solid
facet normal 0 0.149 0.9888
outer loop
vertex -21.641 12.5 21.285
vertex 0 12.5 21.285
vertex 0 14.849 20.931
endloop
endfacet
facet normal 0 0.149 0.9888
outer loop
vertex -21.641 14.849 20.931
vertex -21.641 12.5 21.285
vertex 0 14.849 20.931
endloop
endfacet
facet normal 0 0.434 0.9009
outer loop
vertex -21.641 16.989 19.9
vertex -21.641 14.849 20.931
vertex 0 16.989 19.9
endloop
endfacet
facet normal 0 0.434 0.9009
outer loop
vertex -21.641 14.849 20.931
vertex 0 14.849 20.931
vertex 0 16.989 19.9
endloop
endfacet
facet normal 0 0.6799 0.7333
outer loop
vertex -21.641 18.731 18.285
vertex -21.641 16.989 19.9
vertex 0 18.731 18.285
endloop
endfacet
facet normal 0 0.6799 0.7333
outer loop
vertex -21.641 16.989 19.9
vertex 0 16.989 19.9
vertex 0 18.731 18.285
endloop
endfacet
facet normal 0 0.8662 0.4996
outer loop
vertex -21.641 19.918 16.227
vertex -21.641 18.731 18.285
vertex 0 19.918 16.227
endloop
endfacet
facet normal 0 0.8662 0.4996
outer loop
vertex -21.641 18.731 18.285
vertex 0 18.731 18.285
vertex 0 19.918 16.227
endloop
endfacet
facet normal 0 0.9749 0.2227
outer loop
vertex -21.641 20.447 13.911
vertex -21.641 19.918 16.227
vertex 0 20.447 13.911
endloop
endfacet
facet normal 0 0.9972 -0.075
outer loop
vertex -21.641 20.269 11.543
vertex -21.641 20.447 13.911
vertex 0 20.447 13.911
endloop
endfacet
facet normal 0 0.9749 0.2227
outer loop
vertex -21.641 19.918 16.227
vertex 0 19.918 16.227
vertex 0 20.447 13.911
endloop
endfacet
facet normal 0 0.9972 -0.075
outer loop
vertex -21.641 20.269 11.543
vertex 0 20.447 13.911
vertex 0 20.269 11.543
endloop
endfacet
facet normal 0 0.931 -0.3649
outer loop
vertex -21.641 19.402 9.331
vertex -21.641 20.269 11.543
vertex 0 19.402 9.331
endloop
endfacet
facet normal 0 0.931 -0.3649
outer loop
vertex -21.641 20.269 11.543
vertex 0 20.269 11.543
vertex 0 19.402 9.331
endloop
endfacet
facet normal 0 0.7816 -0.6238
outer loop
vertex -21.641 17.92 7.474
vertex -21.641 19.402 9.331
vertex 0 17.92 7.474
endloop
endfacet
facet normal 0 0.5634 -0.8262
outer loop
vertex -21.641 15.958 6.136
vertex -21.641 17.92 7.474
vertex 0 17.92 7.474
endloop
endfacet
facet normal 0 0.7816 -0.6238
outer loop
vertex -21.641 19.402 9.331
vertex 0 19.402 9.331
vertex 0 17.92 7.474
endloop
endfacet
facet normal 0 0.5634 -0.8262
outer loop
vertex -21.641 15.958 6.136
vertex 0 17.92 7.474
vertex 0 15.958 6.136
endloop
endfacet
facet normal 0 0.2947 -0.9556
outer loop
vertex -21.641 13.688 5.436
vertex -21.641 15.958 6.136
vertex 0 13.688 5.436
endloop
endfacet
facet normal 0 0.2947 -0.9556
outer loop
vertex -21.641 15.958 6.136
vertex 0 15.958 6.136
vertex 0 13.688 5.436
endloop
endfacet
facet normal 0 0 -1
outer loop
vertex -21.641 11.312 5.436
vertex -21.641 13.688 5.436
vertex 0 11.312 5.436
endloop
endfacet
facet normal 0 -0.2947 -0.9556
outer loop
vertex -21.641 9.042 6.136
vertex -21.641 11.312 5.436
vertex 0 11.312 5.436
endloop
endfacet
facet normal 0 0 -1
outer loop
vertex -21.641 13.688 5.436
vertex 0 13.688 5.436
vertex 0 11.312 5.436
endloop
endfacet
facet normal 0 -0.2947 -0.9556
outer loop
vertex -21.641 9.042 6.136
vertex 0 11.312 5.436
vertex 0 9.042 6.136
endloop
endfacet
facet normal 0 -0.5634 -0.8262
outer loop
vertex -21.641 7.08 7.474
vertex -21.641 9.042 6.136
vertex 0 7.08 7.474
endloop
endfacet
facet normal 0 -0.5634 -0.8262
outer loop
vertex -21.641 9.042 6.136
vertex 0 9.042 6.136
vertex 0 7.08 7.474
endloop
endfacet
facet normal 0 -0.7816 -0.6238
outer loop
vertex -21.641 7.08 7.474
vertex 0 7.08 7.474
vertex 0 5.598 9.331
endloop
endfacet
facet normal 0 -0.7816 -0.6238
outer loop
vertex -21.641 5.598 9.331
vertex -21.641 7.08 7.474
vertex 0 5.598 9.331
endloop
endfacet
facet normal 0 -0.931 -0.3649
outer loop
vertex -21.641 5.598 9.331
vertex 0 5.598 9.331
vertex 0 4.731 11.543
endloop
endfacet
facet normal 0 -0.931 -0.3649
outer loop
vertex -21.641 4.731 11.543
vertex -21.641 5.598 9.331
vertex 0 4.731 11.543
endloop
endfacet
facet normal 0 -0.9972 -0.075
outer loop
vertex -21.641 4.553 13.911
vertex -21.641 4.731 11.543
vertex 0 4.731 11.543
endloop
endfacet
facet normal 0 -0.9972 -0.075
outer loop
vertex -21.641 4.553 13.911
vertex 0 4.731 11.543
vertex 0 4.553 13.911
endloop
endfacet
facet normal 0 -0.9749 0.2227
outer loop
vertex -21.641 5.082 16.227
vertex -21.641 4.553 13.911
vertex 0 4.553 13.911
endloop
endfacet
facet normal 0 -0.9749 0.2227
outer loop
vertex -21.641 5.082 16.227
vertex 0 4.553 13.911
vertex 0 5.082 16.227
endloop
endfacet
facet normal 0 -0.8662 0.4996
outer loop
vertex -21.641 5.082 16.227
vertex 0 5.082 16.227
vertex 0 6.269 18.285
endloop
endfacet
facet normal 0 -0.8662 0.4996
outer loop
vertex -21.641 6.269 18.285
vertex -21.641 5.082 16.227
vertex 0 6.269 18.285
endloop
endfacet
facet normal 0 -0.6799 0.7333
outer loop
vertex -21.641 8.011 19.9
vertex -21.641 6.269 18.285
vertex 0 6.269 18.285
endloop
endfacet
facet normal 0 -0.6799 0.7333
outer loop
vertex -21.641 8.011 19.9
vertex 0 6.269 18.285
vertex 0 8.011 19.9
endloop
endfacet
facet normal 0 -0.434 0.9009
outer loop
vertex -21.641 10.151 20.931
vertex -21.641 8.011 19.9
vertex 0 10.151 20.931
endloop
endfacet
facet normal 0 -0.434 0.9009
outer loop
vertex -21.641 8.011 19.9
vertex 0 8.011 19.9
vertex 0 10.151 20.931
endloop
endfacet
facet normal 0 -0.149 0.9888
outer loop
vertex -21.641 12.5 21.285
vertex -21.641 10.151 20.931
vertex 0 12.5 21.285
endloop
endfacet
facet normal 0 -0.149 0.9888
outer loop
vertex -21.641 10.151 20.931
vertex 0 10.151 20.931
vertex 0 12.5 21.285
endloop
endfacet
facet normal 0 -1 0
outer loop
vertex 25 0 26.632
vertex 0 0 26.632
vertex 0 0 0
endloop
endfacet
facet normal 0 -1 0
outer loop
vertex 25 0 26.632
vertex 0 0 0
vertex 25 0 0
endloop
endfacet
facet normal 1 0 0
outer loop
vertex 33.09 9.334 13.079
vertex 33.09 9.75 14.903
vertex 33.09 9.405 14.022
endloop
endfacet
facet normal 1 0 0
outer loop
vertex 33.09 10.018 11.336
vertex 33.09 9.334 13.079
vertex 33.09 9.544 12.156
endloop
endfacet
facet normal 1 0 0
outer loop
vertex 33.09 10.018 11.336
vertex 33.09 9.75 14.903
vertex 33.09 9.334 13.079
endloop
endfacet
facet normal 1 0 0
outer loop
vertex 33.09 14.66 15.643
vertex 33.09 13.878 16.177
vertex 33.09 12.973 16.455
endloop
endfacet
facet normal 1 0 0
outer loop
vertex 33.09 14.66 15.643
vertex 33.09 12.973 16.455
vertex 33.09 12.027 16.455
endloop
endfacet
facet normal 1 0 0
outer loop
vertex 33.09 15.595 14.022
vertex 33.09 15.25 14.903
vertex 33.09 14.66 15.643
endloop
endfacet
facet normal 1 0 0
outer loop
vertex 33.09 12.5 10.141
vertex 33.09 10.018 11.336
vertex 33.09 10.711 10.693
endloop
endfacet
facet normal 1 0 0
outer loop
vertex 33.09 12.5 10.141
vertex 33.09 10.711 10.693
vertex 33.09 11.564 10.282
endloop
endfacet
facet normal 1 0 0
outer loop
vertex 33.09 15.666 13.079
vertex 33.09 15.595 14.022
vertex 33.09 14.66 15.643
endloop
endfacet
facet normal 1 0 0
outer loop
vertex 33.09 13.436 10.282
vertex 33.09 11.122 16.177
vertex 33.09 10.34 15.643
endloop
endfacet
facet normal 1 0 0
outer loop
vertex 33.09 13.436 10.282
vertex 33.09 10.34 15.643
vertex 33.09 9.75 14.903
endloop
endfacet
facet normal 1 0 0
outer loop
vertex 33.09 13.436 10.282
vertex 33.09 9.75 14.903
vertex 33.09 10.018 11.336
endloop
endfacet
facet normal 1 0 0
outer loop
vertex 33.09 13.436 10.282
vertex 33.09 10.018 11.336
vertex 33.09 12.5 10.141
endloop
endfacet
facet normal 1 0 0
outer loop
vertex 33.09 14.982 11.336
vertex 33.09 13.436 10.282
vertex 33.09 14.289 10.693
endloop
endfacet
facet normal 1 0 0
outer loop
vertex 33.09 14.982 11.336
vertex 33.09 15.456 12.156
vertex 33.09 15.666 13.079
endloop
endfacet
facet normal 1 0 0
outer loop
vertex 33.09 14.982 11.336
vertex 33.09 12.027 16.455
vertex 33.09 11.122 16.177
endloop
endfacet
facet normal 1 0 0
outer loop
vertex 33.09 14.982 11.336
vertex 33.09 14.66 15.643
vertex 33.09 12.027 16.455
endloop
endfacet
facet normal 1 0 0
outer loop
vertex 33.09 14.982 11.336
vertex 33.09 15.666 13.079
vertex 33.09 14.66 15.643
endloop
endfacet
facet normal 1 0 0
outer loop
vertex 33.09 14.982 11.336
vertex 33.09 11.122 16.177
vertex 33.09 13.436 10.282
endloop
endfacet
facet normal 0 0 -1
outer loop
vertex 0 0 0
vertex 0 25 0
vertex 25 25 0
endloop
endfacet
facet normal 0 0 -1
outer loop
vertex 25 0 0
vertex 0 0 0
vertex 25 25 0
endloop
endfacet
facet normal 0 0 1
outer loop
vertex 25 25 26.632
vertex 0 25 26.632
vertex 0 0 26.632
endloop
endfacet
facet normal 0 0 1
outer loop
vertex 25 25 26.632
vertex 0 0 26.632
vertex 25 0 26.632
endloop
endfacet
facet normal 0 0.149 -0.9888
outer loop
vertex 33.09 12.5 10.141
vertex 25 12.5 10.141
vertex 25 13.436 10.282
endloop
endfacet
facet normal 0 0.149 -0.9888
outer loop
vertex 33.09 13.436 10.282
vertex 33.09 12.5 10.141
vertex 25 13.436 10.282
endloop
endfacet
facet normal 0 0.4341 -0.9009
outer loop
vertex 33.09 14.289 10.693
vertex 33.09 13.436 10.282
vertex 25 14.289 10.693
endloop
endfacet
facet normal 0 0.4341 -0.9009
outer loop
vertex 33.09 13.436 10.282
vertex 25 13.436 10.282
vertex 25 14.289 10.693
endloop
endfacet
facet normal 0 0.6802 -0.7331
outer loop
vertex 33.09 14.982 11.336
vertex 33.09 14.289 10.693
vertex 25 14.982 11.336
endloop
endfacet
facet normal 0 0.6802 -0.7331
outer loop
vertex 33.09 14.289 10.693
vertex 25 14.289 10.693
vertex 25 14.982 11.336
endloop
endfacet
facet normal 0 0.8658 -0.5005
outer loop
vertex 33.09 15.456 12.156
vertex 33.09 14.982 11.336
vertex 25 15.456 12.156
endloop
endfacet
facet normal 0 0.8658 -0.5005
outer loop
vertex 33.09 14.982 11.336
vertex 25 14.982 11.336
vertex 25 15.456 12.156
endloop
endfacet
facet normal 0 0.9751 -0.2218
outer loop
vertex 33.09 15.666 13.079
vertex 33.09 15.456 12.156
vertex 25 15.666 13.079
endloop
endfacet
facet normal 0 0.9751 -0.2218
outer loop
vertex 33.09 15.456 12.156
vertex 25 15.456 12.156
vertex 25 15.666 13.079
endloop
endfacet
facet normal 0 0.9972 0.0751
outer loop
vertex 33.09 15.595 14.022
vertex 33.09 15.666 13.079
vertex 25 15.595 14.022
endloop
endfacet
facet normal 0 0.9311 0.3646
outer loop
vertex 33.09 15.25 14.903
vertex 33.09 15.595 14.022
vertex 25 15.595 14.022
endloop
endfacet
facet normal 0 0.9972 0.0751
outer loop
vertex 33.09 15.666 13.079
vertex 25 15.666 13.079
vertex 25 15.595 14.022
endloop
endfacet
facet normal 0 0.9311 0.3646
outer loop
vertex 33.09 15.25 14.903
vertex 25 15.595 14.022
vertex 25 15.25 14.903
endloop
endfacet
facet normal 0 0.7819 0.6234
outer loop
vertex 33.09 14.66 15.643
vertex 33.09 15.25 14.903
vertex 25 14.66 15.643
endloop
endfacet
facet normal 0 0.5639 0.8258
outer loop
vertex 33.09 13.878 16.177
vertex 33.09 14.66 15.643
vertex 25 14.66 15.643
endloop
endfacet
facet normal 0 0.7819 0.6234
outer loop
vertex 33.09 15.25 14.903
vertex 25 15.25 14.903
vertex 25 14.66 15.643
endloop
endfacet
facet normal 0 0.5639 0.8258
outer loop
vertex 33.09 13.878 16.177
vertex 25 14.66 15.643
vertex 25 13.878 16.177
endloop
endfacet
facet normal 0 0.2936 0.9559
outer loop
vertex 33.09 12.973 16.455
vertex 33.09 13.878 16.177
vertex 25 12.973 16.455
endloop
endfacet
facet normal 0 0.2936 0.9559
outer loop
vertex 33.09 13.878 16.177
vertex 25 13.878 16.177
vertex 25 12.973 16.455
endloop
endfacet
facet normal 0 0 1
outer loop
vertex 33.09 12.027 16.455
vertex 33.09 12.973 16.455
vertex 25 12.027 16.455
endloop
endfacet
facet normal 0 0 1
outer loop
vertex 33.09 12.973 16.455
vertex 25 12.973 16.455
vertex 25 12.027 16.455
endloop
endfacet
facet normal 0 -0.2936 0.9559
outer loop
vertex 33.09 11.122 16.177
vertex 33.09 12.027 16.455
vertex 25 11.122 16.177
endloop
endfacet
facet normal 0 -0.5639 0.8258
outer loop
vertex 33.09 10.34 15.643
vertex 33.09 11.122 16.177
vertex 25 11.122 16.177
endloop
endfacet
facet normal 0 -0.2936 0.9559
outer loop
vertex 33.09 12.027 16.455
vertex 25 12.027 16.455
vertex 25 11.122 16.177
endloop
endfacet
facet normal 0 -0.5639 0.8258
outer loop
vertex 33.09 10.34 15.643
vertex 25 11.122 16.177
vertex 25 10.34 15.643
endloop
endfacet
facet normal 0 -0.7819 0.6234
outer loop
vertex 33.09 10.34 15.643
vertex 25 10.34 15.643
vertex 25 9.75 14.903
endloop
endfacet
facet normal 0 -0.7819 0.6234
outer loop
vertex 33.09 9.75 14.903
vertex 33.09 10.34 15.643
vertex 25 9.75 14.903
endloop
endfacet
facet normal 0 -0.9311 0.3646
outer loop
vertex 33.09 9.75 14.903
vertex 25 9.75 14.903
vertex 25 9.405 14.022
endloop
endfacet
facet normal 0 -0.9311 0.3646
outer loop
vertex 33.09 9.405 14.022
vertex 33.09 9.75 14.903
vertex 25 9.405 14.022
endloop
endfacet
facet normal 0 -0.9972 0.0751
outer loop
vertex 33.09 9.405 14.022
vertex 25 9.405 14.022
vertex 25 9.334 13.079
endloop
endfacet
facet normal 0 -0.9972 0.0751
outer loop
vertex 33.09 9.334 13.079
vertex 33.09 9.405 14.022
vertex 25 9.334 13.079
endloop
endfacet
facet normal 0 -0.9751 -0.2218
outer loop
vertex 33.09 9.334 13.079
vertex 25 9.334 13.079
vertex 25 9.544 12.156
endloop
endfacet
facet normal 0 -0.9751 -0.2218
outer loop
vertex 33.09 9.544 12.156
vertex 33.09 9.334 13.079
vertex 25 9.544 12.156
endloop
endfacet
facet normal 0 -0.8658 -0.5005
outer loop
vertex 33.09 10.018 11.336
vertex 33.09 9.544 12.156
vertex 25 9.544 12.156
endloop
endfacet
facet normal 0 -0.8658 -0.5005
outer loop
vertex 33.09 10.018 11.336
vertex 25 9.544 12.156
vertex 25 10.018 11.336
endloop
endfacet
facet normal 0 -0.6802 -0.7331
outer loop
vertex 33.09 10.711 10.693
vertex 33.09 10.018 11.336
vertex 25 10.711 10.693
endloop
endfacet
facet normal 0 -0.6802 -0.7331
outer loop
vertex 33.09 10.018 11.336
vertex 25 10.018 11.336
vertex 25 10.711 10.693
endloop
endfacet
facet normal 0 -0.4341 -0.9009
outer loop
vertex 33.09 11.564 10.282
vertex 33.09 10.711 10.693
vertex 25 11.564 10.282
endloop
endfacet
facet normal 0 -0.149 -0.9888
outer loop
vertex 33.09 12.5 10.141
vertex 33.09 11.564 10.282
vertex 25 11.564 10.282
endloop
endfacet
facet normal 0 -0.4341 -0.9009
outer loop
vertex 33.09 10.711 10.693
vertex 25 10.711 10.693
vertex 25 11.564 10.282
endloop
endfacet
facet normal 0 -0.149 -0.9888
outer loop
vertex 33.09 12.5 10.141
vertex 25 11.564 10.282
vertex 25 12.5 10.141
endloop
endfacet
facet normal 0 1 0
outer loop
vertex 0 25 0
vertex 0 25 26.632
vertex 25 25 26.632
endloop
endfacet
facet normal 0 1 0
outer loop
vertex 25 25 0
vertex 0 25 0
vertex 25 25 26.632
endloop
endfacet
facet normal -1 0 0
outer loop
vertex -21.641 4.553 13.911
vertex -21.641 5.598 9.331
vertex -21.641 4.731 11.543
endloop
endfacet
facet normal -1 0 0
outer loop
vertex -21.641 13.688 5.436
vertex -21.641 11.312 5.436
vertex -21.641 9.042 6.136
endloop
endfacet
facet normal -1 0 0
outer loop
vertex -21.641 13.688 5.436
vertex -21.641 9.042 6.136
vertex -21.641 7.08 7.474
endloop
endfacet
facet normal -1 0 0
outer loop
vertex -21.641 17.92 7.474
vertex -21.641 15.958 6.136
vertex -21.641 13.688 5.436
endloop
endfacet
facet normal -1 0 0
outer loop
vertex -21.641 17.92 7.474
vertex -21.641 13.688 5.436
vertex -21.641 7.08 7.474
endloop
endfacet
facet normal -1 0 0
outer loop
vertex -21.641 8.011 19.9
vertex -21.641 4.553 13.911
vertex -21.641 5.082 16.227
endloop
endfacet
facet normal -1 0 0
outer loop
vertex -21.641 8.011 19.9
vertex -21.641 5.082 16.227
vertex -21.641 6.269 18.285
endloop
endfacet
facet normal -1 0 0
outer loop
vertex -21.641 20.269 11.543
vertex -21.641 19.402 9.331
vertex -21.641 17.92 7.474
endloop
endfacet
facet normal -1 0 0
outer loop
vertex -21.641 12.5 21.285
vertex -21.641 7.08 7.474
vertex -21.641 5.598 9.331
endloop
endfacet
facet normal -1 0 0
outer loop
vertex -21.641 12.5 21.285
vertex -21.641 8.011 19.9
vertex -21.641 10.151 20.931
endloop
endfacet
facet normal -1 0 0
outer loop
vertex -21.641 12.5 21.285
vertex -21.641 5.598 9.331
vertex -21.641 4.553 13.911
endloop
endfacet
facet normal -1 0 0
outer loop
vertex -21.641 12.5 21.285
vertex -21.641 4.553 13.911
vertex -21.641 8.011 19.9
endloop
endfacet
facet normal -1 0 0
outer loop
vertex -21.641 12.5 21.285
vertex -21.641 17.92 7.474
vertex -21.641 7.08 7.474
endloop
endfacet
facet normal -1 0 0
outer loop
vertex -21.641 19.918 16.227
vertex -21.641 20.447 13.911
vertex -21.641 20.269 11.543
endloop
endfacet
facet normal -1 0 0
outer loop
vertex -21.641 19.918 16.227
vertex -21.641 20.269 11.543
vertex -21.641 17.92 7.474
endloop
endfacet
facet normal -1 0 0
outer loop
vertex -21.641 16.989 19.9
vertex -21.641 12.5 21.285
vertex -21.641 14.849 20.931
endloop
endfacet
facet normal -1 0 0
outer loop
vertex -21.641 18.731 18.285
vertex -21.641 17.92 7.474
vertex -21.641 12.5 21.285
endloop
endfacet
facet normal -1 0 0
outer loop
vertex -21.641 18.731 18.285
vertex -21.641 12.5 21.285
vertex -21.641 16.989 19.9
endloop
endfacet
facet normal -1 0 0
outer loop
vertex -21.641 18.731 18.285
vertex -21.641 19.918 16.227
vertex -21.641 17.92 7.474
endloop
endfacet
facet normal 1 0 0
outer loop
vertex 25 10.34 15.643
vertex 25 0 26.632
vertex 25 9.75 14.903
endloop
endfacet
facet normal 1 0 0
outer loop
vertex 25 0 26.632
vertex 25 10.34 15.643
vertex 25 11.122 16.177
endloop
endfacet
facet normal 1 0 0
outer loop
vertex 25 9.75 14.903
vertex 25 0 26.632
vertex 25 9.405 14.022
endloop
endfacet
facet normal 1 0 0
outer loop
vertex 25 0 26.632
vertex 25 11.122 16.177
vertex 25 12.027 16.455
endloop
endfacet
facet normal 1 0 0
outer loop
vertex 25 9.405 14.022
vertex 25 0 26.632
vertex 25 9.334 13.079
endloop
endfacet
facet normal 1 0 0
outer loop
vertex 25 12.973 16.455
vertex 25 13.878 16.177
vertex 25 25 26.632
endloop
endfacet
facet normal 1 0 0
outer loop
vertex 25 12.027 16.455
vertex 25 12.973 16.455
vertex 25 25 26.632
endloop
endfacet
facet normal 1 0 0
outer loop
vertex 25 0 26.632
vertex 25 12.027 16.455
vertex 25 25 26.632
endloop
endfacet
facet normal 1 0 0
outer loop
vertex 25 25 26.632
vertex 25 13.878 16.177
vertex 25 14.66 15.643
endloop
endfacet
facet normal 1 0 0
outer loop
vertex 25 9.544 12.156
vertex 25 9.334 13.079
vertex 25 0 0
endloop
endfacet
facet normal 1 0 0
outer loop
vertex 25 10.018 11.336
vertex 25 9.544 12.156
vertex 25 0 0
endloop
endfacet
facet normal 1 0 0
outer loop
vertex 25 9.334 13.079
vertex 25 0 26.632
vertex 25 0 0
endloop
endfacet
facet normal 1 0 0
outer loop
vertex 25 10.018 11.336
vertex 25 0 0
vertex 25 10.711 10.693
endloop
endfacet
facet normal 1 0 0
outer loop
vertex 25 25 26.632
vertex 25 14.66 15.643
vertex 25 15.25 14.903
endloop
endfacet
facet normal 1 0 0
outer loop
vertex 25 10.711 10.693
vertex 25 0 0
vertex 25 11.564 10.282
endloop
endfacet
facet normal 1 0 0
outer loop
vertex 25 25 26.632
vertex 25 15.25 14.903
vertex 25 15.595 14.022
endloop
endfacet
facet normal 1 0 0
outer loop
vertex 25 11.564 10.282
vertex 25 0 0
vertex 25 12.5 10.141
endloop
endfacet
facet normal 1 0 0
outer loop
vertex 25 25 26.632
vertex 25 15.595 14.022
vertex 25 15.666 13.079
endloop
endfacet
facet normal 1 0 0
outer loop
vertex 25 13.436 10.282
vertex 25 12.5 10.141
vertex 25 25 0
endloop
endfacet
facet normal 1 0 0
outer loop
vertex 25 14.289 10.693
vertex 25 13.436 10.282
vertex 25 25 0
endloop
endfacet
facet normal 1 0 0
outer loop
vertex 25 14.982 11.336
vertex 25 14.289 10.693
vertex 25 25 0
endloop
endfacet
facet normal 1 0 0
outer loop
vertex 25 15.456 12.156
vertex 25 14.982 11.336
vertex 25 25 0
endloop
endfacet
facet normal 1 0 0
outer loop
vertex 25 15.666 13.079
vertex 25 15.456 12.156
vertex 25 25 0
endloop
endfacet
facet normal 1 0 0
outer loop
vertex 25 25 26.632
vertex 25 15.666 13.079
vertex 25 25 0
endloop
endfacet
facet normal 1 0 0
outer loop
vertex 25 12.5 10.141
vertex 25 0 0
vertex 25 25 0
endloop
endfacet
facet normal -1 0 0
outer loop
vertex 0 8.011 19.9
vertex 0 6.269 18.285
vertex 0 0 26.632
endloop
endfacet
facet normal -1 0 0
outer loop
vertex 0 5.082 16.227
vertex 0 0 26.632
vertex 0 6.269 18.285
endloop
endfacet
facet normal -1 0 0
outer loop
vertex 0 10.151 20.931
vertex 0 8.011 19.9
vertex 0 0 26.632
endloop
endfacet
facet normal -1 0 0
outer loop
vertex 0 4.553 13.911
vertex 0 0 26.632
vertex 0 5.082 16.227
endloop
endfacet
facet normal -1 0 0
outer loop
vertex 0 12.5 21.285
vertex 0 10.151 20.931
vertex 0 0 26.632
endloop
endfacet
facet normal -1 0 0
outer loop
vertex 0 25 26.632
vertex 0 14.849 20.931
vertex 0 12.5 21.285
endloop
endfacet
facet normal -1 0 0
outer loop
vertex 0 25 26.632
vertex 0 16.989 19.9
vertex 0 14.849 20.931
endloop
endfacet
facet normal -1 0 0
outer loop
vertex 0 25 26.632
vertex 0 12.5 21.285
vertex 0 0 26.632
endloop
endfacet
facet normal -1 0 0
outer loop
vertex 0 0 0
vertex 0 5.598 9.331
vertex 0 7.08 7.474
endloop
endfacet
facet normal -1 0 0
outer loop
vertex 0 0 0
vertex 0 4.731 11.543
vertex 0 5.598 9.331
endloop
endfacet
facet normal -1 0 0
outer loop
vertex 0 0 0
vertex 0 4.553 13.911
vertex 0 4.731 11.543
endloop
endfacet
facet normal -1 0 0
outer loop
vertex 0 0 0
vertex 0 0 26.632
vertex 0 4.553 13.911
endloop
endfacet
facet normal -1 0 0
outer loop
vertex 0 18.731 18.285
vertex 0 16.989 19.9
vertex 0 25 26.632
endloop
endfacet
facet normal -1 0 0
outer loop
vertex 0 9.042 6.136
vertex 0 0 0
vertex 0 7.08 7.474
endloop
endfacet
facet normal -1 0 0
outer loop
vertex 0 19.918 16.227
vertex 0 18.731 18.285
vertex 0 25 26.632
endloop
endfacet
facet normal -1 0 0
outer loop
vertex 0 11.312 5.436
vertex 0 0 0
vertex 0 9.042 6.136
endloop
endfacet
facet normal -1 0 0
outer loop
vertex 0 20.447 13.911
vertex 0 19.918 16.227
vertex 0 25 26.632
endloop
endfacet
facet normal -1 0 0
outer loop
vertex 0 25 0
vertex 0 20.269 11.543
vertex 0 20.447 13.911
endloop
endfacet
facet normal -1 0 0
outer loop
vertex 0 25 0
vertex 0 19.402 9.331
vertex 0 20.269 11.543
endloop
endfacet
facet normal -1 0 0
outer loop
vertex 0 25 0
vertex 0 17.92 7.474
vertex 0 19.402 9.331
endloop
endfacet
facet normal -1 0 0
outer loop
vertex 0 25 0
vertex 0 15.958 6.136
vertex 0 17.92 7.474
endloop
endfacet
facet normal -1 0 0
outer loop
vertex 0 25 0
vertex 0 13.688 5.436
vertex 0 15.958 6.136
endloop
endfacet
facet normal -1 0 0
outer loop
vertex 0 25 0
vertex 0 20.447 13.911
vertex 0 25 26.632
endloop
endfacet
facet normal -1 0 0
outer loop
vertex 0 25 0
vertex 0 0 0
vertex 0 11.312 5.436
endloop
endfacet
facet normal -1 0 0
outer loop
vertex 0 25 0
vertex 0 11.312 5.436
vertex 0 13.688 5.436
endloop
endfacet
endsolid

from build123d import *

# Parameters (mm, degrees)
SKETCH1_W           = 25
SKETCH1_H           = 25
BOSS_EXTRUDE1_DEPTH = 26.6319
SKETCH2_R           = 7.96925
BOSS_EXTRUDE2_DEPTH = 21.6408
SKETCH3_R           = 3.175
BOSS_EXTRUDE3_DEPTH = 8.0899


with BuildPart() as part:
    # Sketch1 → Boss-Extrude1 (new body)
    with BuildSketch(Plane.XY):
        with Locations((12.5, 12.5)):
            Rectangle(SKETCH1_W, SKETCH1_H)
    extrude(amount=BOSS_EXTRUDE1_DEPTH)

    # Sketch2 → Boss-Extrude2 (add)
    with BuildSketch(Plane.ZY):
        with Locations((13.31595, 12.5)):
            Circle(SKETCH2_R)
    extrude(amount=BOSS_EXTRUDE2_DEPTH)

    # Sketch3 → Boss-Extrude3 (add)
    with BuildSketch(Plane(origin=(25, 0, 0), x_dir=(0, 0, -1), z_dir=(1, 0, 0))):
        with Locations((-13.31595, 12.5)):
            Circle(SKETCH3_R)
    extrude(amount=BOSS_EXTRUDE3_DEPTH)


solid = part.part
